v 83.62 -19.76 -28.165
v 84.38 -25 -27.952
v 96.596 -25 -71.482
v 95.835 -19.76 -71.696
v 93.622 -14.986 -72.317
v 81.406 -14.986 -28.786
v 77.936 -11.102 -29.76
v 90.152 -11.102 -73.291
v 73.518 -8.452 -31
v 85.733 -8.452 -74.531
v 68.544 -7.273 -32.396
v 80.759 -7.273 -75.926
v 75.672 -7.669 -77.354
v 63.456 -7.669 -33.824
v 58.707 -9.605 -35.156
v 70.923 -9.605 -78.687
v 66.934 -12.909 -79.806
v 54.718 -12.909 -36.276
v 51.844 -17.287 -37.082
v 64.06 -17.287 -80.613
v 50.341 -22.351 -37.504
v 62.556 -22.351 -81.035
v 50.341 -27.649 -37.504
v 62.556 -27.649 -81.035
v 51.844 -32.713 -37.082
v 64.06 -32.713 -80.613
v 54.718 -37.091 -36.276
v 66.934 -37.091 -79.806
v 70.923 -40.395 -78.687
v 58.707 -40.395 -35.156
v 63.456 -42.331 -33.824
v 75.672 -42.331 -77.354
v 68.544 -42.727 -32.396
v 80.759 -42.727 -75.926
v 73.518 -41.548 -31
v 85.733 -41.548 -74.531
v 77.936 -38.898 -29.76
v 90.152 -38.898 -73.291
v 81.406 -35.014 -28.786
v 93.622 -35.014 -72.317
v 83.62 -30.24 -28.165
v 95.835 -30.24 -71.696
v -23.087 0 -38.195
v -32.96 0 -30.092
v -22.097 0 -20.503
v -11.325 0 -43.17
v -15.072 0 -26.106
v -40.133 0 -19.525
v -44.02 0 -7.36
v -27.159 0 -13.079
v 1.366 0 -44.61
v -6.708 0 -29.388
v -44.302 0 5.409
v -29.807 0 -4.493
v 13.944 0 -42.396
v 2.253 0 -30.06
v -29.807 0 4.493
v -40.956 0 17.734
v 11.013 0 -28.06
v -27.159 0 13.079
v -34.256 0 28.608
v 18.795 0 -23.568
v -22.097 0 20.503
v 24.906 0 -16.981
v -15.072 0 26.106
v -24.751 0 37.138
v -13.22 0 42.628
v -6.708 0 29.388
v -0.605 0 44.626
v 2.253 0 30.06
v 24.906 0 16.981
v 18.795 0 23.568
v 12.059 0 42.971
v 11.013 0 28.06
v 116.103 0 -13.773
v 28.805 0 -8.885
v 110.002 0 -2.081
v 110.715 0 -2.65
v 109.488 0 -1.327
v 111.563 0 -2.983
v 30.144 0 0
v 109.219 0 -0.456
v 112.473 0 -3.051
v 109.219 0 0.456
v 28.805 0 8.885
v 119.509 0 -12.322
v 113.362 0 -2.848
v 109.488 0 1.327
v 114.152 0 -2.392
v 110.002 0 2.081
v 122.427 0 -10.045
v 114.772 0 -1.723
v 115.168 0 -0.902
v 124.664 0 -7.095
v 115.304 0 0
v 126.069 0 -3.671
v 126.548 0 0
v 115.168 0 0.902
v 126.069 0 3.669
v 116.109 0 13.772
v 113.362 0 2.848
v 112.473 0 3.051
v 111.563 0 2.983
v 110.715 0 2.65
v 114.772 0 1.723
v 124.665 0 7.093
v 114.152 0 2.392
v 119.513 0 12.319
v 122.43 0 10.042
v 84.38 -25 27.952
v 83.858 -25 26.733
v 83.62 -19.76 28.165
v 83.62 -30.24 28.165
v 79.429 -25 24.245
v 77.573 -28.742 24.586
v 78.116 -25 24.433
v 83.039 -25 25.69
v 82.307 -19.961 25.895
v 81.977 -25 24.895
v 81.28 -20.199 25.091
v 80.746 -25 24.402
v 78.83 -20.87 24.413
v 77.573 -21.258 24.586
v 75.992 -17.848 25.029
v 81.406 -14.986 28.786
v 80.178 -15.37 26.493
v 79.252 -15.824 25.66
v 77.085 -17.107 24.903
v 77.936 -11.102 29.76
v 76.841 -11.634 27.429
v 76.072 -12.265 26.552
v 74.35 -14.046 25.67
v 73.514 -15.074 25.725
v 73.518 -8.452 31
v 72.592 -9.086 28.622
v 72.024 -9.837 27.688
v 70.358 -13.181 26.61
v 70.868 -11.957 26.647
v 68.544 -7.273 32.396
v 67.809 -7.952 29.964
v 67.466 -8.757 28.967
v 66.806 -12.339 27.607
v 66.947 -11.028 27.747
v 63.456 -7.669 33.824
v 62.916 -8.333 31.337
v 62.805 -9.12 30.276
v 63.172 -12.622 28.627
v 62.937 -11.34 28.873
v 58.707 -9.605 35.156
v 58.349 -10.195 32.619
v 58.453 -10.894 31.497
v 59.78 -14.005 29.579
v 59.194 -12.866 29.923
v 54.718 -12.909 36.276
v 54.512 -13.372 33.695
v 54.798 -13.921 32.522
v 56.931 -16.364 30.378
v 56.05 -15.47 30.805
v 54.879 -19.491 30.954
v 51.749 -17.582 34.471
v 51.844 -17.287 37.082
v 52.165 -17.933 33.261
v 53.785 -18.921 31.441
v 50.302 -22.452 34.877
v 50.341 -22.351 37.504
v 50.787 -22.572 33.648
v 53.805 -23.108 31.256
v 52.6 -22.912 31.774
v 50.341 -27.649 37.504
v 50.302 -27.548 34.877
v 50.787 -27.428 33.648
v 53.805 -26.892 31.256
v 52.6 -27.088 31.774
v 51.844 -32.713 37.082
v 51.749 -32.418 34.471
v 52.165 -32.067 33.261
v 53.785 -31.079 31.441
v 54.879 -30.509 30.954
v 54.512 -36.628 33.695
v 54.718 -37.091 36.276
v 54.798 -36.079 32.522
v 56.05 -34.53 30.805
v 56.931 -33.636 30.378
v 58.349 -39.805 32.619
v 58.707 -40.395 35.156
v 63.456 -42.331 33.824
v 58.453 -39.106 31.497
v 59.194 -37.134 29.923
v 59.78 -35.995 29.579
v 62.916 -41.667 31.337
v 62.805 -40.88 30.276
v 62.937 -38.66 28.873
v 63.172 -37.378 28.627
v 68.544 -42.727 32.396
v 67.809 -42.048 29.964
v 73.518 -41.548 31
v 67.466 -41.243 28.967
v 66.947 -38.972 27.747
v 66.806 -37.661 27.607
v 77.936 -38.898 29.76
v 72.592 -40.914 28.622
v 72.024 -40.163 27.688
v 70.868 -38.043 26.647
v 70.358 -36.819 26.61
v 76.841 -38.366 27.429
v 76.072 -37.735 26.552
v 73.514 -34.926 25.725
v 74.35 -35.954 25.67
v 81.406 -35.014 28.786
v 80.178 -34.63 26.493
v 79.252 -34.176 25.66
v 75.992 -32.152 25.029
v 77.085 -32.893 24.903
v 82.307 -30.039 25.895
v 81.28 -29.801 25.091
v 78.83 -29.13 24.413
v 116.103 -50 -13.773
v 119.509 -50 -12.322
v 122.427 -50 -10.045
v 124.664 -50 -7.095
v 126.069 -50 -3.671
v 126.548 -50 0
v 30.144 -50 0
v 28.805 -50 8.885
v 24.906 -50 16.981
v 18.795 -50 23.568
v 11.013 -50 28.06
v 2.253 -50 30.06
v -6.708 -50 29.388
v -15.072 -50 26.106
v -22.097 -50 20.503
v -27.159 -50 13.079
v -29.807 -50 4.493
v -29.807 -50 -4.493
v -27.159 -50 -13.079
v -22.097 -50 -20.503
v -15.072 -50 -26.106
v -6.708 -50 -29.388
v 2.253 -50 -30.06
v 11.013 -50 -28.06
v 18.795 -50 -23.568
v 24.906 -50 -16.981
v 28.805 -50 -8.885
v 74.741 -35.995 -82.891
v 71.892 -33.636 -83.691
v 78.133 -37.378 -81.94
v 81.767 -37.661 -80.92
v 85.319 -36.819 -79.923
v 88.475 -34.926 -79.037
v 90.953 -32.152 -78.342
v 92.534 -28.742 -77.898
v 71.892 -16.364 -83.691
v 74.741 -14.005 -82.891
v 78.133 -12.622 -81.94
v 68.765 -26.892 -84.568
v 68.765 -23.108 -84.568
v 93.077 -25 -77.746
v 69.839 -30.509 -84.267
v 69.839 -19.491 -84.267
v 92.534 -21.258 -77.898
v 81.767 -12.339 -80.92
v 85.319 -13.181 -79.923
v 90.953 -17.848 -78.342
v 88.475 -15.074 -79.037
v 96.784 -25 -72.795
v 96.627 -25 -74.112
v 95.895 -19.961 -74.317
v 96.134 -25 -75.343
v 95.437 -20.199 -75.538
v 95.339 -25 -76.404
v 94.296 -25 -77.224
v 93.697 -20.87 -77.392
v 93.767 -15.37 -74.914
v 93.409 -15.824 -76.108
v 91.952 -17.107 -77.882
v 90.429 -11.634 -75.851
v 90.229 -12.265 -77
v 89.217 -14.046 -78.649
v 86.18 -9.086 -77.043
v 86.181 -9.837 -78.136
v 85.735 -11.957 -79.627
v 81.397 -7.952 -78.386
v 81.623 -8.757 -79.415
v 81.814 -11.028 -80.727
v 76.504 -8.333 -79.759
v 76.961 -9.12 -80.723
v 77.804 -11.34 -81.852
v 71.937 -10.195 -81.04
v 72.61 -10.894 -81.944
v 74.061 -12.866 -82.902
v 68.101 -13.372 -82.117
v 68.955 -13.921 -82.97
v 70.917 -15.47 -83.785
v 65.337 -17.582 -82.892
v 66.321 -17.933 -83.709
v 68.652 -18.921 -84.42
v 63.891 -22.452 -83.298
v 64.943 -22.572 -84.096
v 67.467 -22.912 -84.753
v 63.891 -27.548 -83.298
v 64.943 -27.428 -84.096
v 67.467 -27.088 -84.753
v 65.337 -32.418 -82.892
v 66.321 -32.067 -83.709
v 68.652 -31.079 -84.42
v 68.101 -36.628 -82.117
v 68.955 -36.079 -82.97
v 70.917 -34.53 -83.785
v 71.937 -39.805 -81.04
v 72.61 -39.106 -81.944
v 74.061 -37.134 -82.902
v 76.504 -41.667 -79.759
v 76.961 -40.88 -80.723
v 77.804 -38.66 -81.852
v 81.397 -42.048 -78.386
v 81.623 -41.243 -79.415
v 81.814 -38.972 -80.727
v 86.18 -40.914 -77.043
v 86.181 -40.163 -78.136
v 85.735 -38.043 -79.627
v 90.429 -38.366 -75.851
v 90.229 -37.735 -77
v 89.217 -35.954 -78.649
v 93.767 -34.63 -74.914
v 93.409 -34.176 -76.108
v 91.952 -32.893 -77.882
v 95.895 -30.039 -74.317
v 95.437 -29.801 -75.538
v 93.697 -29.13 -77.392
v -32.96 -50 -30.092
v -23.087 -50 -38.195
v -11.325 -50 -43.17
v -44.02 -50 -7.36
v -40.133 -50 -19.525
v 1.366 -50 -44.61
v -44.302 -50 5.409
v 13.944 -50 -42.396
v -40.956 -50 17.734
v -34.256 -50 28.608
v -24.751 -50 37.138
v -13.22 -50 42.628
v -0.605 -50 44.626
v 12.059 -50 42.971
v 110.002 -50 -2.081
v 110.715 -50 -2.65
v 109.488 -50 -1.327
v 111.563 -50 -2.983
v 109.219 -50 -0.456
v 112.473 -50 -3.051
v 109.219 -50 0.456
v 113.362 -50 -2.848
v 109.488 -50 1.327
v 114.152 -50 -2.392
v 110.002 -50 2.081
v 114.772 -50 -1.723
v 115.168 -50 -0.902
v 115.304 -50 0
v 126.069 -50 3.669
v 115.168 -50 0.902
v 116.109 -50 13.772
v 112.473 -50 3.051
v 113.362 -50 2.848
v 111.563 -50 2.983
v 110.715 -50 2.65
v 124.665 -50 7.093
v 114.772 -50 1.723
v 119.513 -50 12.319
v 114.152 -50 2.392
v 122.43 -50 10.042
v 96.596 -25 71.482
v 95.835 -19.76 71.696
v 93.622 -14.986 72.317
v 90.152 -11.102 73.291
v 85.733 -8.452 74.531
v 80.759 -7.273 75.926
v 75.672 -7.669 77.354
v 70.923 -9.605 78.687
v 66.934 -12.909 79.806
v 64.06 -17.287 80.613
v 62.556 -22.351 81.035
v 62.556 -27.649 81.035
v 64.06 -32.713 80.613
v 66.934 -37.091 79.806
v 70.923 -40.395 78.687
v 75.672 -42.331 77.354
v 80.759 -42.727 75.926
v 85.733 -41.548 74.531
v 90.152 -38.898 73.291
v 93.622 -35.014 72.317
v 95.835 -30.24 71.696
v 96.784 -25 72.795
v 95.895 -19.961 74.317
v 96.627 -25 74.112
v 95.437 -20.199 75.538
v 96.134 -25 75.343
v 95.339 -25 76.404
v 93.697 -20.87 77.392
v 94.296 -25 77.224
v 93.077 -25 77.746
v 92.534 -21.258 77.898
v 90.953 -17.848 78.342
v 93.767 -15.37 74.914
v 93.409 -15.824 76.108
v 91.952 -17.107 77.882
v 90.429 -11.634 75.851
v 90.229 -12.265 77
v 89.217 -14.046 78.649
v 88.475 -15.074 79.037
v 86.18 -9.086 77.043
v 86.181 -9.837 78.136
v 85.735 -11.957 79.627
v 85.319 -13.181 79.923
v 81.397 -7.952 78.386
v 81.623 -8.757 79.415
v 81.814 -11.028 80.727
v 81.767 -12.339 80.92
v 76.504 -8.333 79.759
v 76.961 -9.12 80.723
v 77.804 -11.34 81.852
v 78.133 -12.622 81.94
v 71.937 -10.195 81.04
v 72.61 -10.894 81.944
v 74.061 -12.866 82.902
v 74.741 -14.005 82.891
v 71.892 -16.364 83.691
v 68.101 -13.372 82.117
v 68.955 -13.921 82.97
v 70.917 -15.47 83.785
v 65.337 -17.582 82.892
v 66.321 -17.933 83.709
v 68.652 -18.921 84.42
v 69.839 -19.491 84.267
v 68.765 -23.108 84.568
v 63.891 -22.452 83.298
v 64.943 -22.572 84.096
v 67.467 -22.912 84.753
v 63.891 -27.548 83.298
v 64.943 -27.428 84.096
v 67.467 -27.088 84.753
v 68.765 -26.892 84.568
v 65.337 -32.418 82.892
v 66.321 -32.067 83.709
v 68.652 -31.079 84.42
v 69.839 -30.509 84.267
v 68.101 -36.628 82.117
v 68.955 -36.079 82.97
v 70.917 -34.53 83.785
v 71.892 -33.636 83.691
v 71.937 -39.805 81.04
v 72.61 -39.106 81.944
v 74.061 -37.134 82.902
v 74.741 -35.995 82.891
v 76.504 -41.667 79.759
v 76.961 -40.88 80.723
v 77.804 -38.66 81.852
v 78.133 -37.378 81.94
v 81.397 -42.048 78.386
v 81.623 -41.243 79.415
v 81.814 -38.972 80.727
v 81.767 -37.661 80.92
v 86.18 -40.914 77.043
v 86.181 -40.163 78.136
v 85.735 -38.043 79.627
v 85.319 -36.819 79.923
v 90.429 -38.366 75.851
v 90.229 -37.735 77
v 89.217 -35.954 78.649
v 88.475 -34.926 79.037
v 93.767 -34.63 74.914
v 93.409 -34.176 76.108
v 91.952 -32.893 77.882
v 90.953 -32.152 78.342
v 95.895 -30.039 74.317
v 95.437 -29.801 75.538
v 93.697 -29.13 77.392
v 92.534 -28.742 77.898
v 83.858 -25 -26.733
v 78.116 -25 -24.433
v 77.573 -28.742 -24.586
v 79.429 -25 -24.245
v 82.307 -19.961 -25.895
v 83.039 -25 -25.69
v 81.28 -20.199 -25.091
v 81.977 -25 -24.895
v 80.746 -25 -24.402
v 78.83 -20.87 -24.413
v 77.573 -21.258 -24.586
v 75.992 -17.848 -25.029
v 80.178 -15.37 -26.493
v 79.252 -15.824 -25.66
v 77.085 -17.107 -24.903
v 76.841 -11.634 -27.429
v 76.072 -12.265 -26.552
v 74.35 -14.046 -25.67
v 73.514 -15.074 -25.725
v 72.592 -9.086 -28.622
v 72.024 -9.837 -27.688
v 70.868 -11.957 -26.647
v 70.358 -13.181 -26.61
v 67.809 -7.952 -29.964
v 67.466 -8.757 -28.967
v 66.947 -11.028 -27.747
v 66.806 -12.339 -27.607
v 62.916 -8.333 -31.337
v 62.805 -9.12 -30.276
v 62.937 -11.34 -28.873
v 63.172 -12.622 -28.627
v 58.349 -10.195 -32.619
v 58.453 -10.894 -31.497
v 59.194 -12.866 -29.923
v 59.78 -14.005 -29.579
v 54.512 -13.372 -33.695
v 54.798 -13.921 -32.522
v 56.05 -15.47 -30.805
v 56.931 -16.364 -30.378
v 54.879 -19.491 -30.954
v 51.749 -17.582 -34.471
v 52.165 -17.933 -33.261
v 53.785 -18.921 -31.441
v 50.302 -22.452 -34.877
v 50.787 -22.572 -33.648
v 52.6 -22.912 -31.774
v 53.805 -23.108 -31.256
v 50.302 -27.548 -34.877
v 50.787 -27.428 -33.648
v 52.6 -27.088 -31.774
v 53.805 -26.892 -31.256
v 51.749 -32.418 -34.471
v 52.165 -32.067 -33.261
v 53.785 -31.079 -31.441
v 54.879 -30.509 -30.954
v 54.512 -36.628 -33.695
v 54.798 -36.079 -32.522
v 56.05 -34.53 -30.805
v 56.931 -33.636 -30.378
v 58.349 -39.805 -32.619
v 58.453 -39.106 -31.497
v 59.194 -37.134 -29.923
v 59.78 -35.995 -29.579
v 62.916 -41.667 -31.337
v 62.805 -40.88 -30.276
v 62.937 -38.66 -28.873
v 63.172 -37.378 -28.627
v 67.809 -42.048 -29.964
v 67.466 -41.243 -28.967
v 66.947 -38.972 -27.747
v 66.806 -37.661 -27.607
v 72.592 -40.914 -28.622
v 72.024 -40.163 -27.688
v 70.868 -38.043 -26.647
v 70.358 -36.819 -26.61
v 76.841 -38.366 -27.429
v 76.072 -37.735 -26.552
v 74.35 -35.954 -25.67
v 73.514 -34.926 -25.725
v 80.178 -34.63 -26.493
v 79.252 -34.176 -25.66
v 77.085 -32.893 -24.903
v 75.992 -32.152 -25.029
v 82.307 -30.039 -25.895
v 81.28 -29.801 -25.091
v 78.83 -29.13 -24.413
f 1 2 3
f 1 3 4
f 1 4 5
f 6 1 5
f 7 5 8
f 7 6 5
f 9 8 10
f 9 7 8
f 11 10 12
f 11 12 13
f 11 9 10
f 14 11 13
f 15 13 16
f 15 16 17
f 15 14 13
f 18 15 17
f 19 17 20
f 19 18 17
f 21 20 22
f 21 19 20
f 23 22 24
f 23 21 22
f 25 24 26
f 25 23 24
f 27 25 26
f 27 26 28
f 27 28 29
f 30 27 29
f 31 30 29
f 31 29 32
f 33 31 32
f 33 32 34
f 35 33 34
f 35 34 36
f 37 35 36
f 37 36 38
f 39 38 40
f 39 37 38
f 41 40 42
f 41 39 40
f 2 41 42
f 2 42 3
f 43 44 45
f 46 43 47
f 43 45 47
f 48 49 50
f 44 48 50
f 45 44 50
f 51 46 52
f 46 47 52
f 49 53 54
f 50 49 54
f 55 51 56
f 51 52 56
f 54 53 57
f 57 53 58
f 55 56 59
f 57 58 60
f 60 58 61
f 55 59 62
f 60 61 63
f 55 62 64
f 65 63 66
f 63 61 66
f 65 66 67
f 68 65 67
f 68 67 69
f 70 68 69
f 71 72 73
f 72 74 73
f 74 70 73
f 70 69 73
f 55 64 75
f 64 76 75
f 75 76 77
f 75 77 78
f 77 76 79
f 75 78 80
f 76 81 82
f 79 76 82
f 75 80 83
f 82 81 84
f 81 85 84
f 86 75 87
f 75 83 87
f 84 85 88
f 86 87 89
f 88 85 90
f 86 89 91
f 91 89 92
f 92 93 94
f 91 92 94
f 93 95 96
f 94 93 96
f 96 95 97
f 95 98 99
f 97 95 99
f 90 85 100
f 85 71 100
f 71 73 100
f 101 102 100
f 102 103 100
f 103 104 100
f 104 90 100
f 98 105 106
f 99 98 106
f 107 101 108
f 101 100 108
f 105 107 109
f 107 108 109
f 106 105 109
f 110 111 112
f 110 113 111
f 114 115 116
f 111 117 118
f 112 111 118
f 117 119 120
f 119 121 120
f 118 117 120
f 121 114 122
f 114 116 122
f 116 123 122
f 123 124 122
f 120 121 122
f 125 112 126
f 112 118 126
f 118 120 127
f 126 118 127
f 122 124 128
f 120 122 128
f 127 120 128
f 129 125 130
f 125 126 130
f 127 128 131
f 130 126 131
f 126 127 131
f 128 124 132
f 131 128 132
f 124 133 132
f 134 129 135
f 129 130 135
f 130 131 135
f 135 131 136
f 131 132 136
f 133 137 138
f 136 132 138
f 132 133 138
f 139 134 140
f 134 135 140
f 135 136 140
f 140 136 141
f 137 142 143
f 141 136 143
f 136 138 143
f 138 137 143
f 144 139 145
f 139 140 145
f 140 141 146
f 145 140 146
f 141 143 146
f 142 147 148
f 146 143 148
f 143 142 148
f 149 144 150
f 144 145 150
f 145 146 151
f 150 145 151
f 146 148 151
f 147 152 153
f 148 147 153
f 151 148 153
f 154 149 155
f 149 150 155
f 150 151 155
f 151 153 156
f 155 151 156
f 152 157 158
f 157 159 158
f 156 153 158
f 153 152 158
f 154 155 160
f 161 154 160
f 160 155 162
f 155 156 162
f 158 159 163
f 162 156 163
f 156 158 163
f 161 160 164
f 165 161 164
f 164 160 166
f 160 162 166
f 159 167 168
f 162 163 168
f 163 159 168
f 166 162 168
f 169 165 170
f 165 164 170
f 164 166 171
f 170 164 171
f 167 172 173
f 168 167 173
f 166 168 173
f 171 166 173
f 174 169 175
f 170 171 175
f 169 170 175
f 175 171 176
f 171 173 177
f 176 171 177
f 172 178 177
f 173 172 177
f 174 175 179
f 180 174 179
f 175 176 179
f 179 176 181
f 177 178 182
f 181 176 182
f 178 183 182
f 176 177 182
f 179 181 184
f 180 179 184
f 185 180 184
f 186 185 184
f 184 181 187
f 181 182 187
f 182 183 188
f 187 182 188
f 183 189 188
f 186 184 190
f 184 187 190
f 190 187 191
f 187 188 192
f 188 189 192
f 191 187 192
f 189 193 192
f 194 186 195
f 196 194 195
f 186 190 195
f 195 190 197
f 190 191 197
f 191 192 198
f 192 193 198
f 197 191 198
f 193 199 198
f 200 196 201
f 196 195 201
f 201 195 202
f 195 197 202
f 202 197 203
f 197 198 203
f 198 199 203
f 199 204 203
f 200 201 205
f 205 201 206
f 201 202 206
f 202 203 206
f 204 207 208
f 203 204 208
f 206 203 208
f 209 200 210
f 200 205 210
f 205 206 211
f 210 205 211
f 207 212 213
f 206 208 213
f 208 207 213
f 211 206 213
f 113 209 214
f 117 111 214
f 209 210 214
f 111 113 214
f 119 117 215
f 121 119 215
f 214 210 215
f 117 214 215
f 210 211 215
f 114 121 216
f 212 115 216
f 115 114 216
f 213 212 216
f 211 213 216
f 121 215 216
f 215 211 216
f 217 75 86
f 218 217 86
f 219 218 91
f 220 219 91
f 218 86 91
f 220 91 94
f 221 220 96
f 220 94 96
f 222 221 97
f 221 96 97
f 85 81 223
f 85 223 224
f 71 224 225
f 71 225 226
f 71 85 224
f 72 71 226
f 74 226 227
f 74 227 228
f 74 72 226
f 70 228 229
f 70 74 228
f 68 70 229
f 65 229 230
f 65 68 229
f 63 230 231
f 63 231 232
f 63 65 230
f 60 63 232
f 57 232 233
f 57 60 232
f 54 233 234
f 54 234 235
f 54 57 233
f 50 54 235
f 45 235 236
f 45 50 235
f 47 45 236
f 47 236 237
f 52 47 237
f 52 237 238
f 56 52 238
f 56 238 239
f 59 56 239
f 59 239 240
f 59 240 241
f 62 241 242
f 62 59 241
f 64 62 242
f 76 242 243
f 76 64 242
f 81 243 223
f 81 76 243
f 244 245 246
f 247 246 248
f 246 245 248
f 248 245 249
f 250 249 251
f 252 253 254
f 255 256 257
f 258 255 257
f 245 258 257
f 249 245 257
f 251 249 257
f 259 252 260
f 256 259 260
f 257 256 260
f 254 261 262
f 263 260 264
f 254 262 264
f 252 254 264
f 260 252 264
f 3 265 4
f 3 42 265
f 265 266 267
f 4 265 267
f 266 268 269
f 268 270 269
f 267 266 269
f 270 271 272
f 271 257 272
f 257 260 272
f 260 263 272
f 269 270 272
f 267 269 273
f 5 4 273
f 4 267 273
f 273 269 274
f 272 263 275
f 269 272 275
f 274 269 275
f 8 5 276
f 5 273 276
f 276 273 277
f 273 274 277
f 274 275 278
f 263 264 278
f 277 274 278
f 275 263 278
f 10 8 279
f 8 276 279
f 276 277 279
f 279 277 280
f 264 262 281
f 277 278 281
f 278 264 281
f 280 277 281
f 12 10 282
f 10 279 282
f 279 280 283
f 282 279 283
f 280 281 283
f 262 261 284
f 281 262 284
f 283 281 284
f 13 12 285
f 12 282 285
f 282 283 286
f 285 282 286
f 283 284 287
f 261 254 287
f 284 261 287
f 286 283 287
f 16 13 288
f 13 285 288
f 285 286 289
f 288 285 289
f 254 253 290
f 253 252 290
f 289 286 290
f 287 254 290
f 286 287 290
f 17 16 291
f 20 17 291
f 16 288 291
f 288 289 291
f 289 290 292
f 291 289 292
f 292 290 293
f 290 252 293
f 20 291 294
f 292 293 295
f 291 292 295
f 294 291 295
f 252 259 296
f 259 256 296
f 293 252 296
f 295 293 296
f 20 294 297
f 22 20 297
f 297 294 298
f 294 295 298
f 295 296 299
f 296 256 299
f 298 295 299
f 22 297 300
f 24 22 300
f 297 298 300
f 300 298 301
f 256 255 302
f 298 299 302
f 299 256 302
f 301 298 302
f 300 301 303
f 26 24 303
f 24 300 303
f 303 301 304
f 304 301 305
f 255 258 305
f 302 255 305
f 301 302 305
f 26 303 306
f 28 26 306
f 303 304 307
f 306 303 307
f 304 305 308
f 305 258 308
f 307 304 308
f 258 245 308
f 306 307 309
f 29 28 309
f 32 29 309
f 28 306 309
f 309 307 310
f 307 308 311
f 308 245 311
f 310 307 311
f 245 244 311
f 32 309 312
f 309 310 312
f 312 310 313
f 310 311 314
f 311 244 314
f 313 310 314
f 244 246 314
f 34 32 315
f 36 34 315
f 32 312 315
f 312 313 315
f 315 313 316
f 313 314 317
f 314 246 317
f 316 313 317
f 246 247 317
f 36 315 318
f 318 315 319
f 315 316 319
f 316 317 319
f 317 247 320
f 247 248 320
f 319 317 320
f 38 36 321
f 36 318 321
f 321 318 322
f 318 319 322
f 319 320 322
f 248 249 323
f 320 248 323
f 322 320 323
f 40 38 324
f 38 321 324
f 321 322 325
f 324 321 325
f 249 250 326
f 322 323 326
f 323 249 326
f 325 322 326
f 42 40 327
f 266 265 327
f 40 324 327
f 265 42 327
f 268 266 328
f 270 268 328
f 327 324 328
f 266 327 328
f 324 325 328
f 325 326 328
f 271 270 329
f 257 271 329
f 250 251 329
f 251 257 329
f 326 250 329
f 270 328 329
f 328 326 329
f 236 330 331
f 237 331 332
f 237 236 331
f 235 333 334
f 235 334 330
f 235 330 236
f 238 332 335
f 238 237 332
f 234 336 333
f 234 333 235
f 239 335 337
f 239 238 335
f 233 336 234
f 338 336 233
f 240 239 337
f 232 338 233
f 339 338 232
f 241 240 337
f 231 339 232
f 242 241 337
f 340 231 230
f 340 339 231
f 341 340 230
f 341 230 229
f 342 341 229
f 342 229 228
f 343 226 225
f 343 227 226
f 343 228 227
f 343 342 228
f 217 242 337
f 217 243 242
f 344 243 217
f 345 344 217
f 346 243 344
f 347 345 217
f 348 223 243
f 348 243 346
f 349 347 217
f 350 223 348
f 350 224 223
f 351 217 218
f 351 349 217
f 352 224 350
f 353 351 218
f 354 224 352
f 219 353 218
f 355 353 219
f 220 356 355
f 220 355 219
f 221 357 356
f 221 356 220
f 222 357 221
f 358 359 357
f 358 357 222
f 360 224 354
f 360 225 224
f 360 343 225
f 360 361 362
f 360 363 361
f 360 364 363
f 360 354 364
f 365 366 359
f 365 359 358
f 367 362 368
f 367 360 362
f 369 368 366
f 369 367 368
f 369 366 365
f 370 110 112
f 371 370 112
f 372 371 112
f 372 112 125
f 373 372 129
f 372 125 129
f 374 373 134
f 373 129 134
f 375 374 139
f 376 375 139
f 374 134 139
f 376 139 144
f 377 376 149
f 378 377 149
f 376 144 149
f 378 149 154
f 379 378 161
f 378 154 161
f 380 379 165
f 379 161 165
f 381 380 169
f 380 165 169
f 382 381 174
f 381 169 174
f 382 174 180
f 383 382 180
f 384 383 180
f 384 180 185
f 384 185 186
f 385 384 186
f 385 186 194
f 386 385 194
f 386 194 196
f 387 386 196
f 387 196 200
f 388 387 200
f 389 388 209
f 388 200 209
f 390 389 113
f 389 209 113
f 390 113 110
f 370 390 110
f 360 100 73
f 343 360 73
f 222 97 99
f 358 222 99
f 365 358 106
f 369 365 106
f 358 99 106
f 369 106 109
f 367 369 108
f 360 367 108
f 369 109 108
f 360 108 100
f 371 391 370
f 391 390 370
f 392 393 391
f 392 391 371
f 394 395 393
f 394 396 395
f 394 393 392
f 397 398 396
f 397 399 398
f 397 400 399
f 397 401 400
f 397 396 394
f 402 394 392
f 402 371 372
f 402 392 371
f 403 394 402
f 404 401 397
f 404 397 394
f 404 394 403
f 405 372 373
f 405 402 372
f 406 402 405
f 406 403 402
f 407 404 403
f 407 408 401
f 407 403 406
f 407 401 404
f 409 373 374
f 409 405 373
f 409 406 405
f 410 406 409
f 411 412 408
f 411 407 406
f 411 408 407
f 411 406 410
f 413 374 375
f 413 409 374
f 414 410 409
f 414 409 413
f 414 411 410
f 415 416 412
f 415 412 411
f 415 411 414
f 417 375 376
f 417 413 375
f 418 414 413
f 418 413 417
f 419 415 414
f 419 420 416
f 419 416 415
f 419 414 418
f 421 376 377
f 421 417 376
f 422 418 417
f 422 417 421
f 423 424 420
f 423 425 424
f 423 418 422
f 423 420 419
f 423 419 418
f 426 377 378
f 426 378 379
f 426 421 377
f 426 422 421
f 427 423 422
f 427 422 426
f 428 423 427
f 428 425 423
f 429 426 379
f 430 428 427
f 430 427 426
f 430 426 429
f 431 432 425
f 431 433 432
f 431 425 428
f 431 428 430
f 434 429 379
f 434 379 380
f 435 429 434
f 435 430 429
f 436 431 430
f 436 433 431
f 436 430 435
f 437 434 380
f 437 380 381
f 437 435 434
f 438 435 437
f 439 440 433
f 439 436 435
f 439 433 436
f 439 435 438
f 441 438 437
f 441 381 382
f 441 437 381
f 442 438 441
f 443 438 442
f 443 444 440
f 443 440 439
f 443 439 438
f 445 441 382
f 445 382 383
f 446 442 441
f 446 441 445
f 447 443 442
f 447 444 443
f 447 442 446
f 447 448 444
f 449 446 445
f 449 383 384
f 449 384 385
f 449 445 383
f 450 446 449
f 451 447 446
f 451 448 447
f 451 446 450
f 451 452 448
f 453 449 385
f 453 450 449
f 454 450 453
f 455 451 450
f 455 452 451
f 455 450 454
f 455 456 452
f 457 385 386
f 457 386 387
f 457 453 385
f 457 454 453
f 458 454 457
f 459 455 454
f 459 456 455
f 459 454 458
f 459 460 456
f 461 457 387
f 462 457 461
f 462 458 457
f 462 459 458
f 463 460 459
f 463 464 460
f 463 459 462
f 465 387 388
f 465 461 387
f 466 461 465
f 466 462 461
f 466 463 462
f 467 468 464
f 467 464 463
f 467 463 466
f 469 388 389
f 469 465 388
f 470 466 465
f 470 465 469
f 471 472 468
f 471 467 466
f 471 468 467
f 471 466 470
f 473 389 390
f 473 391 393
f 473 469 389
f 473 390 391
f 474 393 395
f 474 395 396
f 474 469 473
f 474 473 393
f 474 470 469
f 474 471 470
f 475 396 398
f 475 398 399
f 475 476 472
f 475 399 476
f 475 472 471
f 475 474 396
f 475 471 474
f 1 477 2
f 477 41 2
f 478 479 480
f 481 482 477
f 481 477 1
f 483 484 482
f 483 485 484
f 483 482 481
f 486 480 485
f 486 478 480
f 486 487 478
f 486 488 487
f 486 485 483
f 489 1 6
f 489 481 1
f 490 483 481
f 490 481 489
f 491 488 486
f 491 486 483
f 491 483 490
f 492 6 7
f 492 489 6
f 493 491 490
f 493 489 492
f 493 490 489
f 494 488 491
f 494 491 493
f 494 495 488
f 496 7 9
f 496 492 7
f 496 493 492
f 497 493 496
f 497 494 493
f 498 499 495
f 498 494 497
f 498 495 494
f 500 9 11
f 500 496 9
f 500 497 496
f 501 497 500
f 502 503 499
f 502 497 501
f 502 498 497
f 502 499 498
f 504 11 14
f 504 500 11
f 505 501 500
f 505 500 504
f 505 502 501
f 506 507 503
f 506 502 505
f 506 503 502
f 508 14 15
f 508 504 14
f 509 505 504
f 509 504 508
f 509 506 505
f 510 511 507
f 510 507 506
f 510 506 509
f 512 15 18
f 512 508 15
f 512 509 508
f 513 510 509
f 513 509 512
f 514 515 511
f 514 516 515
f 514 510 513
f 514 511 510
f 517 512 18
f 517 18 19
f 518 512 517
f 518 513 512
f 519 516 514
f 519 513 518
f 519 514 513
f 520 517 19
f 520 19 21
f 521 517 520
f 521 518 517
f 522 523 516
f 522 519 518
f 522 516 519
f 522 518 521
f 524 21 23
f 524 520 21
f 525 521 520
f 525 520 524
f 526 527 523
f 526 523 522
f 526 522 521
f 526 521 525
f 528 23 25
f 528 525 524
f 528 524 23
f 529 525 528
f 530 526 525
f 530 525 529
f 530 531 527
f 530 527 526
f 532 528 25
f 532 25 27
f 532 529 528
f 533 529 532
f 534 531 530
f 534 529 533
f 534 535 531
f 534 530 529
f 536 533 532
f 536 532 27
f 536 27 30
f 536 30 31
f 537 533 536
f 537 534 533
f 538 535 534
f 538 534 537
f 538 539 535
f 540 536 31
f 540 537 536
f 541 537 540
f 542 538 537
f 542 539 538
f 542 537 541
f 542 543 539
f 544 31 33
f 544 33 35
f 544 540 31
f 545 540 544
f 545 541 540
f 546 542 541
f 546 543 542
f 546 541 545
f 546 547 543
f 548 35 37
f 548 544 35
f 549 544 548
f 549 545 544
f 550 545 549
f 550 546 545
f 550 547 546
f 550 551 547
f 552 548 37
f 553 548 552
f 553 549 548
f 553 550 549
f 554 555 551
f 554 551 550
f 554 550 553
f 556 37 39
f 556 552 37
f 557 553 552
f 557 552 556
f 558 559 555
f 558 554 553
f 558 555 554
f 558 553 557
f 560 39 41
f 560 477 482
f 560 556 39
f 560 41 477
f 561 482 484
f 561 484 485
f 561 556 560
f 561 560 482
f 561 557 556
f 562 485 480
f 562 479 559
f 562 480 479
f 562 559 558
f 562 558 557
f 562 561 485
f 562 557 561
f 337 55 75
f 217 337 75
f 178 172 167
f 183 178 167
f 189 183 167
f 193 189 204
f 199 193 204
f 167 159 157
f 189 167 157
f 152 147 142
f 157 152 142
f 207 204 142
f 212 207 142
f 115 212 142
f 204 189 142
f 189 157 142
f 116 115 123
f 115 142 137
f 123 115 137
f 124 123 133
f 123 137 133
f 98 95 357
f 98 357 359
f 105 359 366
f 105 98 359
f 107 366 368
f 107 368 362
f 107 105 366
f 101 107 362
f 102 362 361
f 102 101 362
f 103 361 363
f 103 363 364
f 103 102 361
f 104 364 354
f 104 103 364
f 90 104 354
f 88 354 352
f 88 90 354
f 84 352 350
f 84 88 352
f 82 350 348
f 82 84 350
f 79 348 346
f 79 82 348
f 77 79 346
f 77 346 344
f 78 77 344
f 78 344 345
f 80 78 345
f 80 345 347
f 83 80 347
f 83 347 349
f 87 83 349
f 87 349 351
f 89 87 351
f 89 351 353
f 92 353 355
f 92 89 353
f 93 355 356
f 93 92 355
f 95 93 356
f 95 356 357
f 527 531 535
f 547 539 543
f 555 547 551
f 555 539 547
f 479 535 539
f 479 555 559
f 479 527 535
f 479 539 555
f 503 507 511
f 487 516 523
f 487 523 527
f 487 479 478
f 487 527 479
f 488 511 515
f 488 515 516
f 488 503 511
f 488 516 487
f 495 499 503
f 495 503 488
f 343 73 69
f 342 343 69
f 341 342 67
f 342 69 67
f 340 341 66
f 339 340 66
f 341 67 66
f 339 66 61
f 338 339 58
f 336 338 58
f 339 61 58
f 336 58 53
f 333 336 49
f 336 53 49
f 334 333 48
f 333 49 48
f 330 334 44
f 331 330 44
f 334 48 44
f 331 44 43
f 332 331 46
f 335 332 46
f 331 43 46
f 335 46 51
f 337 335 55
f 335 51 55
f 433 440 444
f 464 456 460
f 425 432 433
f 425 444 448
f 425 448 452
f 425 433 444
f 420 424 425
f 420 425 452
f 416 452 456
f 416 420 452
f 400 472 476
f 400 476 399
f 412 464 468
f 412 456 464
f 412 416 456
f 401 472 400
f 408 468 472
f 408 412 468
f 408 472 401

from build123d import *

# Parameters (mm, degrees)
F0_R     = 30.144048
F0_R_2   = 3.059417
F1_DEPTH = 50
F2_R     = 17.776425
F3_DEPTH = 55.372
F4_R     = 5.08


with BuildPart() as f1:
    # F0 (on Front) → F1 (new body)
    with BuildSketch(Plane.XZ):
        with BuildLine():
            ThreePointArc((13.944059, -42.39634), (36.153959, -26.168257), (44.630555, 0))
            ThreePointArc((44.630555, 0), (35.567306, 26.960214), (12.058559, 42.97066))
            ThreePointArc((12.058559, 42.97066), (-44.619673, -0.985514), (13.944059, -42.39634))
        make_face()
        Circle(F0_R, mode=Mode.SUBTRACT)
        with BuildLine():
            ThreePointArc((12.058559, 42.97066), (35.567306, 26.960214), (44.630555, 0))
            ThreePointArc((44.630555, 0), (36.153959, -26.168257), (13.944059, -42.39634))
            Line((13.944059, -42.39634), (116.103264, -13.773313))
            ThreePointArc((116.103264, -13.773313), (97.940537, 0.002934), (116.108913, 13.771729))
            Line((116.108913, 13.771729), (12.058559, 42.97066))
        make_face()
        with BuildLine():
            ThreePointArc((126.54796, 0), (123.643266, 8.640518), (116.108913, 13.771729))
            ThreePointArc((116.108913, 13.771729), (97.940537, 0.002934), (116.103264, -13.773313))
            ThreePointArc((116.103264, -13.773313), (123.641494, -8.642856), (126.54796, 0))
        make_face()
        with Locations((112.244248, 0)):
            Circle(F0_R_2, mode=Mode.SUBTRACT)
    extrude(amount=F1_DEPTH)


with BuildPart() as f3:
    # F2 (on face) → F3 (new body)
    with BuildSketch(Plane(origin=(12.058559, 0, 42.97066), x_dir=(0.962808, 0, -0.270186), z_dir=(0.270186, 0, 0.962808))):
        with Locations((55.913217, -25)):
            Circle(F2_R)
    extrude(amount=F3_DEPTH)

    # F4
    f4_edges = [f3.edges().sort_by_distance(p)[0] for p in [
        (63.73772, -25, 85.979236),
        (48.776971, -25, 32.666626),
    ]]
    fillet(f4_edges, radius=F4_R)


with BuildPart() as f5_1:
    # F5: instance of F3
    add(f3.part.mirror(Plane.XY))


solid = Compound([f1.part, f3.part, f5_1.part])
